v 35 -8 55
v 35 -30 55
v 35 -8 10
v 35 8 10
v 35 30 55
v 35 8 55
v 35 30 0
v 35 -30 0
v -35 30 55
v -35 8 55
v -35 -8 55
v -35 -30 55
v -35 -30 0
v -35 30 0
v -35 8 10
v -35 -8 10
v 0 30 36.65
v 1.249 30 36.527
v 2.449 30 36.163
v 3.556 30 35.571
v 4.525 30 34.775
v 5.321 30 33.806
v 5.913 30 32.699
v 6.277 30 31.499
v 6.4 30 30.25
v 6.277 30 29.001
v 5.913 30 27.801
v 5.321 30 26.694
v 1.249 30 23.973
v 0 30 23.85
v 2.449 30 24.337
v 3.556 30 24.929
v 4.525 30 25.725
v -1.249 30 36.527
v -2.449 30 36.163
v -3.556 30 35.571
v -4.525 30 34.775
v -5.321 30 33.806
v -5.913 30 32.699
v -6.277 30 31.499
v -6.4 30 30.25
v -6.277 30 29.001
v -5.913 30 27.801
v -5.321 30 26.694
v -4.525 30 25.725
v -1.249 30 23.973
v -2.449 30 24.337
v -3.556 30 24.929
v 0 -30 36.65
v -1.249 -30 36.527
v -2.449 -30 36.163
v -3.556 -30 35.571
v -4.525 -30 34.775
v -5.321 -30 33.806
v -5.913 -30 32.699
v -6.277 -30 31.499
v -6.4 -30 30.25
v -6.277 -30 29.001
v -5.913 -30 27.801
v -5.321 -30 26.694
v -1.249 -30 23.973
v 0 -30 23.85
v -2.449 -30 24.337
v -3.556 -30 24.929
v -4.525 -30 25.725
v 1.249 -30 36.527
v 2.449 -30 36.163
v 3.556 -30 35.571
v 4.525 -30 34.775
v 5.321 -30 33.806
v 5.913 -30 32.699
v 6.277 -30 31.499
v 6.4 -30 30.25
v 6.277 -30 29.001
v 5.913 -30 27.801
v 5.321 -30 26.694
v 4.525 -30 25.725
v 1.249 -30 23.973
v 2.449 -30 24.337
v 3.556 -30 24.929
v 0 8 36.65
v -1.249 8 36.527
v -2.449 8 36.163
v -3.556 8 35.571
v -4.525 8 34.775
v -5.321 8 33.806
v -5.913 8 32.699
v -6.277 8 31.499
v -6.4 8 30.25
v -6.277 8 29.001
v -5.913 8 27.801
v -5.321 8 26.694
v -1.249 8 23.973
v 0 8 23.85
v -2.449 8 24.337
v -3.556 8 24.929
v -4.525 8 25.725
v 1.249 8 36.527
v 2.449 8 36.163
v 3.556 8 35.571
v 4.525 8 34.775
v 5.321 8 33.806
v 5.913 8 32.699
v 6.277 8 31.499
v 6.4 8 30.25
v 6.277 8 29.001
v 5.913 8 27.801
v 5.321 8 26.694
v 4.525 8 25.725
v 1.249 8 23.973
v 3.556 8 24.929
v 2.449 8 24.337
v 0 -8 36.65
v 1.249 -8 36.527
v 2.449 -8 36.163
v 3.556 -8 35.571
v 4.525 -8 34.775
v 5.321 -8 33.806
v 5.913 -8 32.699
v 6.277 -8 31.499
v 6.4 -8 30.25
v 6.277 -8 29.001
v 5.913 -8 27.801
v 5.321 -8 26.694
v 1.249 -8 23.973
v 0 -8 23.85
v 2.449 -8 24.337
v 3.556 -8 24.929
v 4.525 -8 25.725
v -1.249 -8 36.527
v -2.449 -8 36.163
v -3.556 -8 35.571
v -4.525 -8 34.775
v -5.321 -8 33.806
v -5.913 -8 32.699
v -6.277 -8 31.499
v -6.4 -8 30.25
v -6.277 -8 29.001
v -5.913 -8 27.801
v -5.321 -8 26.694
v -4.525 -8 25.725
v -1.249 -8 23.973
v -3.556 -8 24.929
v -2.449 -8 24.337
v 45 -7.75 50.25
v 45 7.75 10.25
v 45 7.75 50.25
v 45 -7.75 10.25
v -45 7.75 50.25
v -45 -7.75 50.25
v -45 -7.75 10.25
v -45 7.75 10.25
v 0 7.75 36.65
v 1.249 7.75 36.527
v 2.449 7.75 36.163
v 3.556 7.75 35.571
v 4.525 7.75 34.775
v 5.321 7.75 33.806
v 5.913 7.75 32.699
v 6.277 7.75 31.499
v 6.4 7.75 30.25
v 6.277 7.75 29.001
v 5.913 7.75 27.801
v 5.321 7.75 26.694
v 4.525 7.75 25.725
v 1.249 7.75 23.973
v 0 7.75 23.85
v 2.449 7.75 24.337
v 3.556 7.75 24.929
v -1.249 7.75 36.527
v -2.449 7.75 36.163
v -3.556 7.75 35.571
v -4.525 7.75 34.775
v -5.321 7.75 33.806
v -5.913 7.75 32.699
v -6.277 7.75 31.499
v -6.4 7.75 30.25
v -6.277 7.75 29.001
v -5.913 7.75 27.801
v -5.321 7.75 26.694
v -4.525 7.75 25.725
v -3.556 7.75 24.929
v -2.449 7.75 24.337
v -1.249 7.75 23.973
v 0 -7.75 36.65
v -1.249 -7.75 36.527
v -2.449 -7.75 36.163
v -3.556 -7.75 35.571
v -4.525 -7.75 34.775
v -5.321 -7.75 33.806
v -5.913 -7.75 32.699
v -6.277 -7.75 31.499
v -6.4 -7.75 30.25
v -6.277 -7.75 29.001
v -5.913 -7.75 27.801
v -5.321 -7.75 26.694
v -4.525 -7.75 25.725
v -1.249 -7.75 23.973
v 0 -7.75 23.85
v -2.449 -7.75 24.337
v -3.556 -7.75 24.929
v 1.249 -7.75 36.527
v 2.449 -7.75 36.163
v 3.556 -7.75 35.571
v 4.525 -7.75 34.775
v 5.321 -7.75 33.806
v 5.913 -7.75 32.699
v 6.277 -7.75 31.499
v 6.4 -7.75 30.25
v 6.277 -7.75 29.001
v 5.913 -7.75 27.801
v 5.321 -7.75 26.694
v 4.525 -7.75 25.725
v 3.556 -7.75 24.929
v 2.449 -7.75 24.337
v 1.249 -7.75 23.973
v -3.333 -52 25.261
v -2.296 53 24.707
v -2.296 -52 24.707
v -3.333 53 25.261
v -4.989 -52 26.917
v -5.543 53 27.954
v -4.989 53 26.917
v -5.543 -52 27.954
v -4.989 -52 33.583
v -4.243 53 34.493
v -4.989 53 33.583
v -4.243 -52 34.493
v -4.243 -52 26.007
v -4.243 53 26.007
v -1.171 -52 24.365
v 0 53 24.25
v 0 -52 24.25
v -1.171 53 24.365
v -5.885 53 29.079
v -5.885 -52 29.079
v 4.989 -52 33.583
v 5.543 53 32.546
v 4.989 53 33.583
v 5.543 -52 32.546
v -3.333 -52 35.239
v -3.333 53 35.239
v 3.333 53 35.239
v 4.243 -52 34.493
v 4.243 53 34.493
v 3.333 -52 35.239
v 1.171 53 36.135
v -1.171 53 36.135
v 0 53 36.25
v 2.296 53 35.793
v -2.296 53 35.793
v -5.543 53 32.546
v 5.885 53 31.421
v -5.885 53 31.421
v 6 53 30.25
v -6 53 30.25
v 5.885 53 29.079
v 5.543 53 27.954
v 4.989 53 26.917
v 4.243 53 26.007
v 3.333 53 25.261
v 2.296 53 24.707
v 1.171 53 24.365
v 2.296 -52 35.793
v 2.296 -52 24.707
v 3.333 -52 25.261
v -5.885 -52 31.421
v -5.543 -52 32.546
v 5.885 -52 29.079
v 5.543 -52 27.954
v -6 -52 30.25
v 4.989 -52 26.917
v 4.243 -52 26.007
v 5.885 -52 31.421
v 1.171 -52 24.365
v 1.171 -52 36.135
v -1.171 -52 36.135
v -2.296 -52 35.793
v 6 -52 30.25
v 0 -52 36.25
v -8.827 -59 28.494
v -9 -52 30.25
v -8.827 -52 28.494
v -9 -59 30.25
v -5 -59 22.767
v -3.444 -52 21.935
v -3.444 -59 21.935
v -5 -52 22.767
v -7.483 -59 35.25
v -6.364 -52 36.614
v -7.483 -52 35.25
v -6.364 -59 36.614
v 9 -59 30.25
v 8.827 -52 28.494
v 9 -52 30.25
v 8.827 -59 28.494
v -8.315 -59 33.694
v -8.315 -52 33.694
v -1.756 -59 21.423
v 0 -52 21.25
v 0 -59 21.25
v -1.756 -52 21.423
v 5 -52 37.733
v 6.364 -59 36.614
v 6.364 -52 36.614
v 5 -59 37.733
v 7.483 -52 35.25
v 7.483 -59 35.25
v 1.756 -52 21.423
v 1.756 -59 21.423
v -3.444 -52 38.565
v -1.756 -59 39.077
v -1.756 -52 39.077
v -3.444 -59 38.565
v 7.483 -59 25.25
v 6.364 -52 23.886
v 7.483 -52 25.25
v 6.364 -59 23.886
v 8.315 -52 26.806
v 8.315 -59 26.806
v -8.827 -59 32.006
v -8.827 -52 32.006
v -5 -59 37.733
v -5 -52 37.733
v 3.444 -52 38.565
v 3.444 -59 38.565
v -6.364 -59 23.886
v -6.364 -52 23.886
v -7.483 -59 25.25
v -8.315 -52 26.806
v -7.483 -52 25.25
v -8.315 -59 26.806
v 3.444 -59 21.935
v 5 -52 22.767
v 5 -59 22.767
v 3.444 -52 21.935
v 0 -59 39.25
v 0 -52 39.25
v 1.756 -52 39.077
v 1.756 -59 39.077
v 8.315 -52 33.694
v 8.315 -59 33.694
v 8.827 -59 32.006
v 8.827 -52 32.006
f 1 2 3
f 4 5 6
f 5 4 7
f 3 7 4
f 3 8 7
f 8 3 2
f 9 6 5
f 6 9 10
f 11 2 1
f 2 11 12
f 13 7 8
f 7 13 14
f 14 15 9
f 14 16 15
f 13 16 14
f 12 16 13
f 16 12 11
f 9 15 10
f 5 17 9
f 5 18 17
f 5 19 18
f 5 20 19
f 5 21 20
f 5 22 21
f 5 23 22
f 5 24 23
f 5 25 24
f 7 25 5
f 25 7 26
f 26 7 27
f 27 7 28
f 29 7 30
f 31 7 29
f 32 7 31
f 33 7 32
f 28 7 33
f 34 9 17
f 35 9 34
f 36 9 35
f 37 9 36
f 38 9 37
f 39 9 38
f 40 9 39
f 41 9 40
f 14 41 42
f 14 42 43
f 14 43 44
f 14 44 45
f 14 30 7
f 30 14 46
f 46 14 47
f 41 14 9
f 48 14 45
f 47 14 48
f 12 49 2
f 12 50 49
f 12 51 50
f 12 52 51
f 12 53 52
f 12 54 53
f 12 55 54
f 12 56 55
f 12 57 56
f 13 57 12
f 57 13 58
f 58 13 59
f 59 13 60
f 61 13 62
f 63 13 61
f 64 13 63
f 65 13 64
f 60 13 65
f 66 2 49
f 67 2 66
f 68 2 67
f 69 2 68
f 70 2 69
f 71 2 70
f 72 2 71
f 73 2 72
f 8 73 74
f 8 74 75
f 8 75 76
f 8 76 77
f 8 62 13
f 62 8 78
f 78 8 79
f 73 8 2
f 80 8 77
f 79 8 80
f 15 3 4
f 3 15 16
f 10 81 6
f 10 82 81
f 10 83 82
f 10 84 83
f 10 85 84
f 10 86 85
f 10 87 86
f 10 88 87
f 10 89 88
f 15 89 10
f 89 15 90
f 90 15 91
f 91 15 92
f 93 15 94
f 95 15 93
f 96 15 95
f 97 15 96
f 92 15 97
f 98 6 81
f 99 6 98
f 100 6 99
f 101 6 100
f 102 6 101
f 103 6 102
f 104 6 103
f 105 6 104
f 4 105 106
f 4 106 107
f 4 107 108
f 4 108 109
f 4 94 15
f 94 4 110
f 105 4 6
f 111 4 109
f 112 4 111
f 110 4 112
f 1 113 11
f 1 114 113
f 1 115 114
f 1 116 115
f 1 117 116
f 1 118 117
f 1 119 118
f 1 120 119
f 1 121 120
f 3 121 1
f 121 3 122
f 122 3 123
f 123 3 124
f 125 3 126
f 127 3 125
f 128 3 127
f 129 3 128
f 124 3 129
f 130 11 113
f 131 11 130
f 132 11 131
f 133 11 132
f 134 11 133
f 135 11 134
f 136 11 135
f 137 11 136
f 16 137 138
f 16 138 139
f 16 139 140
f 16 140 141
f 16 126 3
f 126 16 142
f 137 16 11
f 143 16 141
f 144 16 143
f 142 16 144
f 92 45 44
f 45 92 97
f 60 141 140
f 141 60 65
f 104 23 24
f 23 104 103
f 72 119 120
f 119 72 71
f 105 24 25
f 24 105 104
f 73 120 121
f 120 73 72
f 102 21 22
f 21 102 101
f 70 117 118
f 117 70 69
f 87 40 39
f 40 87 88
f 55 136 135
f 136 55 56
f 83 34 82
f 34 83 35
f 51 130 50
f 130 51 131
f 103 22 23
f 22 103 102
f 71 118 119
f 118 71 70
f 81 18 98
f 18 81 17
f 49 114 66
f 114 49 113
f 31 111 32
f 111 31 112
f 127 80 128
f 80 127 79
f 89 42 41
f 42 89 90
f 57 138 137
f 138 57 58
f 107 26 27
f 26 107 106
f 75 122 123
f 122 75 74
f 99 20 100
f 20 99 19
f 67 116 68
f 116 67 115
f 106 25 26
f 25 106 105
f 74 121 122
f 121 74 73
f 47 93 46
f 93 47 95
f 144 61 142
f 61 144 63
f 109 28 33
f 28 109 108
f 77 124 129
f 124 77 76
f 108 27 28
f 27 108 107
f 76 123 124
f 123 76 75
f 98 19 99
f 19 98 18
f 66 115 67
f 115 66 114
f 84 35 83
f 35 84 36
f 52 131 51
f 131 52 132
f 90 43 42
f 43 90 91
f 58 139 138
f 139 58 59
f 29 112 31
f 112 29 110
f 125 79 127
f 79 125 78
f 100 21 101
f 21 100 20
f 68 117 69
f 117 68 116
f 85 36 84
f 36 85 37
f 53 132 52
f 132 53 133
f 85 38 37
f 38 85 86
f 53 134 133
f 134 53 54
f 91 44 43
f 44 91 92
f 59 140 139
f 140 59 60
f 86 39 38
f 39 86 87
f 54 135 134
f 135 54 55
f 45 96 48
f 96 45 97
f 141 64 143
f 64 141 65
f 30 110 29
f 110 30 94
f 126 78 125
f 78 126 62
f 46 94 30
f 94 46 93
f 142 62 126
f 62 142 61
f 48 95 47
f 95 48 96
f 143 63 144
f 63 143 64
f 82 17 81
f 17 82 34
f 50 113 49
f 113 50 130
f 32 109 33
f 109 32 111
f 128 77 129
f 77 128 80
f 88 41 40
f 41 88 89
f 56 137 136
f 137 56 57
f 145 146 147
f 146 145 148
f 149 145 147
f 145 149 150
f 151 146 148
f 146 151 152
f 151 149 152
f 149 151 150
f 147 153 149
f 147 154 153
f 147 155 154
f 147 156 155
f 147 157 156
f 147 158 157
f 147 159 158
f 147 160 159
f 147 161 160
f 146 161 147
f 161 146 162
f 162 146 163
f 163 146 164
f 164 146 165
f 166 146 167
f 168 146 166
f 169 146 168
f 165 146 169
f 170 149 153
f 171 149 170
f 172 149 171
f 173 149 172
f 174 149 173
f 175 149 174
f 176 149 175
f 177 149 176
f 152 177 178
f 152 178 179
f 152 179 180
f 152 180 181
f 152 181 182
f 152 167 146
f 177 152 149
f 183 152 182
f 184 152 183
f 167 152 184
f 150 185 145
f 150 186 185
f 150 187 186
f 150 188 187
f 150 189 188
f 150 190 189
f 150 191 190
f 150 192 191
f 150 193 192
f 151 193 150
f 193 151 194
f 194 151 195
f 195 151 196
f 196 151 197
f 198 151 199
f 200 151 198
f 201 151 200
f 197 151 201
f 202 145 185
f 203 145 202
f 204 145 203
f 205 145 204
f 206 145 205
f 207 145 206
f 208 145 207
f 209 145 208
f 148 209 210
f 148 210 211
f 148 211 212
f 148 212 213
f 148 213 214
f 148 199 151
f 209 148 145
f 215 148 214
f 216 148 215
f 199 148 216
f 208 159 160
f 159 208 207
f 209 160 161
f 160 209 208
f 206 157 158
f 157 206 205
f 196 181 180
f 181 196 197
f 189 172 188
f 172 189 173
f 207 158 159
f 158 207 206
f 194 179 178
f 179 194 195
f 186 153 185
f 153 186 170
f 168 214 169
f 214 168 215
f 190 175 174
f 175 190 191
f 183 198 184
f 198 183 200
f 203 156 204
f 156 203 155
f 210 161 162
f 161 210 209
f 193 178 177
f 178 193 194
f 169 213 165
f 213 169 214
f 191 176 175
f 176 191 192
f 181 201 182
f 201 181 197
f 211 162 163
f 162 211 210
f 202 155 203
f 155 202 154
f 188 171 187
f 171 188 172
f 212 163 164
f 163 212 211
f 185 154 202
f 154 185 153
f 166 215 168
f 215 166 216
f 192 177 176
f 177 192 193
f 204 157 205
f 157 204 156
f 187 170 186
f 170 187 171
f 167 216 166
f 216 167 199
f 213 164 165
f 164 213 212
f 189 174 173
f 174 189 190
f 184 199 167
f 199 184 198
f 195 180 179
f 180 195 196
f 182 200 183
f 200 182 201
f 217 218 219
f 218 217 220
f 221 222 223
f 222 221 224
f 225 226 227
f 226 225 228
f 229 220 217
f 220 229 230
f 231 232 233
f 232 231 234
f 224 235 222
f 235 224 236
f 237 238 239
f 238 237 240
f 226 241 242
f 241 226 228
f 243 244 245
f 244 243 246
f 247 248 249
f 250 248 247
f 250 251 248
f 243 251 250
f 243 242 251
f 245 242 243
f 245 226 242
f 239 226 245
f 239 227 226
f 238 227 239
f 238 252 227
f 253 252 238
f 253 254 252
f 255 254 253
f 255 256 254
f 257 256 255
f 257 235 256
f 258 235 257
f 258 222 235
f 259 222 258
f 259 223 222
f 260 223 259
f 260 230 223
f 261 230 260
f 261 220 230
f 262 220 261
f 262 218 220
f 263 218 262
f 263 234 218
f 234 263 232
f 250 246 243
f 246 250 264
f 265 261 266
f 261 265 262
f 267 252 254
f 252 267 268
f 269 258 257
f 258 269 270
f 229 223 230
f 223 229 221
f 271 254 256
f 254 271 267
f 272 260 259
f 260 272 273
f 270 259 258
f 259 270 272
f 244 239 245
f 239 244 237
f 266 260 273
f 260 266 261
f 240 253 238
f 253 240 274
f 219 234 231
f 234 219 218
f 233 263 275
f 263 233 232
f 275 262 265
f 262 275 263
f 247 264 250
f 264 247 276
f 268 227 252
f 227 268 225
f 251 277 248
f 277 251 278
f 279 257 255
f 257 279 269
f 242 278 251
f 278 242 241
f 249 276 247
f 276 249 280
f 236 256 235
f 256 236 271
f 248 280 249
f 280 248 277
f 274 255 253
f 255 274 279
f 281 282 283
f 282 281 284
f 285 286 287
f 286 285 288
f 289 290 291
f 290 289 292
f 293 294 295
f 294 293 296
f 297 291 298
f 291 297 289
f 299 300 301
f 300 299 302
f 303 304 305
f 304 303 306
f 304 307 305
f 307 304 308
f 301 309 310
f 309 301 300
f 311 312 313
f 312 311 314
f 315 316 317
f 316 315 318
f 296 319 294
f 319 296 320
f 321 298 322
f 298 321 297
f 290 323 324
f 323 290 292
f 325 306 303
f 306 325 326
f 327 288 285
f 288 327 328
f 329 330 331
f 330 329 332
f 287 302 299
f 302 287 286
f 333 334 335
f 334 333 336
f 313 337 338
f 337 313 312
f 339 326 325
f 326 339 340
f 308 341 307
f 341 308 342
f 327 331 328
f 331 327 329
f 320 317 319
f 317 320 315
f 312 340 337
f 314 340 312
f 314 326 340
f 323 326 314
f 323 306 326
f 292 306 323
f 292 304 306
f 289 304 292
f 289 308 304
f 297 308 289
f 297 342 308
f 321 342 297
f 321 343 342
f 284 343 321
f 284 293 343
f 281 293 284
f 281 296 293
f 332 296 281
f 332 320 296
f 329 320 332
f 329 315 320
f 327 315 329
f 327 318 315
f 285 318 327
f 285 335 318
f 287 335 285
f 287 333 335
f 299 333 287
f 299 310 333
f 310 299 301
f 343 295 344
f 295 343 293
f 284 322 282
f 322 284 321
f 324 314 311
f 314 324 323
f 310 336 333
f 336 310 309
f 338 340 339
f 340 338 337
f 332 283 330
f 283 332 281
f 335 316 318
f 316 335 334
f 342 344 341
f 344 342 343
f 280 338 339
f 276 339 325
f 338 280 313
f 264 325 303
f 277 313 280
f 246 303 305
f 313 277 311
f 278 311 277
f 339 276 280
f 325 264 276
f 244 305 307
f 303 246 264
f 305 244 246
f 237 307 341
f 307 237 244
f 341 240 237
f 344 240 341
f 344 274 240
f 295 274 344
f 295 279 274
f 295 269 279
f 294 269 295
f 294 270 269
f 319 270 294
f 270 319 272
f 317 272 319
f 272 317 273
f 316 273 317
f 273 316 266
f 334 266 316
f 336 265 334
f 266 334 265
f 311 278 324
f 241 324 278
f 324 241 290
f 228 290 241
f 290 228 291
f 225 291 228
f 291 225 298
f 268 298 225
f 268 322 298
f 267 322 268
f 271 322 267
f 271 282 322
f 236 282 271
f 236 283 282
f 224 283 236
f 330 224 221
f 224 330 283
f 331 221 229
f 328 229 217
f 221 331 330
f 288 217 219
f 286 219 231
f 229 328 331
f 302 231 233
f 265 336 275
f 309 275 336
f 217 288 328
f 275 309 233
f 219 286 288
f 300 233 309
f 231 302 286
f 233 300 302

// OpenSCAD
$fn = 32;

// ------------------------------------------------------------------------
// Clevis joint: 70 mm clevis, pin d12
// Every part is its own module, assembly() places them once.
// ------------------------------------------------------------------------

// --- part 1 ---
module clevis() {
  difference() {
    translate([-35, -30, 0]) cube([70, 60, 55]);
    translate([-36, -8, 10]) cube([72, 16, 46]);
    translate([0, 0, 30.25]) rotate([90, 0, 0]) cylinder(h = 62, d = 12.8, center = true);
  }
}

// --- part 2 ---
module eye() {
  difference() {
    translate([-45, -7.75, 0]) cube([90, 15.5, 40]);
    translate([0, 0, 20]) rotate([90, 0, 0]) cylinder(h = 17.5, d = 12.8, center = true);
  }
}

// --- part 3 ---
module pin() {
  rotate([0, 90, 0]) cylinder(h = 106, d = 12, center = true);
  translate([-59, 0, 0]) rotate([0, 90, 0]) cylinder(h = 7, d = 18);
}

// --- assembly ---
module assembly() {
  translate([0, 0, 0]) rotate([0, 0, 0]) clevis();
  translate([0, 0, 10.25]) rotate([0, 0, 0]) eye();
  translate([0, 0, 30.25]) rotate([0, 0, 90]) pin();
}

assembly();
